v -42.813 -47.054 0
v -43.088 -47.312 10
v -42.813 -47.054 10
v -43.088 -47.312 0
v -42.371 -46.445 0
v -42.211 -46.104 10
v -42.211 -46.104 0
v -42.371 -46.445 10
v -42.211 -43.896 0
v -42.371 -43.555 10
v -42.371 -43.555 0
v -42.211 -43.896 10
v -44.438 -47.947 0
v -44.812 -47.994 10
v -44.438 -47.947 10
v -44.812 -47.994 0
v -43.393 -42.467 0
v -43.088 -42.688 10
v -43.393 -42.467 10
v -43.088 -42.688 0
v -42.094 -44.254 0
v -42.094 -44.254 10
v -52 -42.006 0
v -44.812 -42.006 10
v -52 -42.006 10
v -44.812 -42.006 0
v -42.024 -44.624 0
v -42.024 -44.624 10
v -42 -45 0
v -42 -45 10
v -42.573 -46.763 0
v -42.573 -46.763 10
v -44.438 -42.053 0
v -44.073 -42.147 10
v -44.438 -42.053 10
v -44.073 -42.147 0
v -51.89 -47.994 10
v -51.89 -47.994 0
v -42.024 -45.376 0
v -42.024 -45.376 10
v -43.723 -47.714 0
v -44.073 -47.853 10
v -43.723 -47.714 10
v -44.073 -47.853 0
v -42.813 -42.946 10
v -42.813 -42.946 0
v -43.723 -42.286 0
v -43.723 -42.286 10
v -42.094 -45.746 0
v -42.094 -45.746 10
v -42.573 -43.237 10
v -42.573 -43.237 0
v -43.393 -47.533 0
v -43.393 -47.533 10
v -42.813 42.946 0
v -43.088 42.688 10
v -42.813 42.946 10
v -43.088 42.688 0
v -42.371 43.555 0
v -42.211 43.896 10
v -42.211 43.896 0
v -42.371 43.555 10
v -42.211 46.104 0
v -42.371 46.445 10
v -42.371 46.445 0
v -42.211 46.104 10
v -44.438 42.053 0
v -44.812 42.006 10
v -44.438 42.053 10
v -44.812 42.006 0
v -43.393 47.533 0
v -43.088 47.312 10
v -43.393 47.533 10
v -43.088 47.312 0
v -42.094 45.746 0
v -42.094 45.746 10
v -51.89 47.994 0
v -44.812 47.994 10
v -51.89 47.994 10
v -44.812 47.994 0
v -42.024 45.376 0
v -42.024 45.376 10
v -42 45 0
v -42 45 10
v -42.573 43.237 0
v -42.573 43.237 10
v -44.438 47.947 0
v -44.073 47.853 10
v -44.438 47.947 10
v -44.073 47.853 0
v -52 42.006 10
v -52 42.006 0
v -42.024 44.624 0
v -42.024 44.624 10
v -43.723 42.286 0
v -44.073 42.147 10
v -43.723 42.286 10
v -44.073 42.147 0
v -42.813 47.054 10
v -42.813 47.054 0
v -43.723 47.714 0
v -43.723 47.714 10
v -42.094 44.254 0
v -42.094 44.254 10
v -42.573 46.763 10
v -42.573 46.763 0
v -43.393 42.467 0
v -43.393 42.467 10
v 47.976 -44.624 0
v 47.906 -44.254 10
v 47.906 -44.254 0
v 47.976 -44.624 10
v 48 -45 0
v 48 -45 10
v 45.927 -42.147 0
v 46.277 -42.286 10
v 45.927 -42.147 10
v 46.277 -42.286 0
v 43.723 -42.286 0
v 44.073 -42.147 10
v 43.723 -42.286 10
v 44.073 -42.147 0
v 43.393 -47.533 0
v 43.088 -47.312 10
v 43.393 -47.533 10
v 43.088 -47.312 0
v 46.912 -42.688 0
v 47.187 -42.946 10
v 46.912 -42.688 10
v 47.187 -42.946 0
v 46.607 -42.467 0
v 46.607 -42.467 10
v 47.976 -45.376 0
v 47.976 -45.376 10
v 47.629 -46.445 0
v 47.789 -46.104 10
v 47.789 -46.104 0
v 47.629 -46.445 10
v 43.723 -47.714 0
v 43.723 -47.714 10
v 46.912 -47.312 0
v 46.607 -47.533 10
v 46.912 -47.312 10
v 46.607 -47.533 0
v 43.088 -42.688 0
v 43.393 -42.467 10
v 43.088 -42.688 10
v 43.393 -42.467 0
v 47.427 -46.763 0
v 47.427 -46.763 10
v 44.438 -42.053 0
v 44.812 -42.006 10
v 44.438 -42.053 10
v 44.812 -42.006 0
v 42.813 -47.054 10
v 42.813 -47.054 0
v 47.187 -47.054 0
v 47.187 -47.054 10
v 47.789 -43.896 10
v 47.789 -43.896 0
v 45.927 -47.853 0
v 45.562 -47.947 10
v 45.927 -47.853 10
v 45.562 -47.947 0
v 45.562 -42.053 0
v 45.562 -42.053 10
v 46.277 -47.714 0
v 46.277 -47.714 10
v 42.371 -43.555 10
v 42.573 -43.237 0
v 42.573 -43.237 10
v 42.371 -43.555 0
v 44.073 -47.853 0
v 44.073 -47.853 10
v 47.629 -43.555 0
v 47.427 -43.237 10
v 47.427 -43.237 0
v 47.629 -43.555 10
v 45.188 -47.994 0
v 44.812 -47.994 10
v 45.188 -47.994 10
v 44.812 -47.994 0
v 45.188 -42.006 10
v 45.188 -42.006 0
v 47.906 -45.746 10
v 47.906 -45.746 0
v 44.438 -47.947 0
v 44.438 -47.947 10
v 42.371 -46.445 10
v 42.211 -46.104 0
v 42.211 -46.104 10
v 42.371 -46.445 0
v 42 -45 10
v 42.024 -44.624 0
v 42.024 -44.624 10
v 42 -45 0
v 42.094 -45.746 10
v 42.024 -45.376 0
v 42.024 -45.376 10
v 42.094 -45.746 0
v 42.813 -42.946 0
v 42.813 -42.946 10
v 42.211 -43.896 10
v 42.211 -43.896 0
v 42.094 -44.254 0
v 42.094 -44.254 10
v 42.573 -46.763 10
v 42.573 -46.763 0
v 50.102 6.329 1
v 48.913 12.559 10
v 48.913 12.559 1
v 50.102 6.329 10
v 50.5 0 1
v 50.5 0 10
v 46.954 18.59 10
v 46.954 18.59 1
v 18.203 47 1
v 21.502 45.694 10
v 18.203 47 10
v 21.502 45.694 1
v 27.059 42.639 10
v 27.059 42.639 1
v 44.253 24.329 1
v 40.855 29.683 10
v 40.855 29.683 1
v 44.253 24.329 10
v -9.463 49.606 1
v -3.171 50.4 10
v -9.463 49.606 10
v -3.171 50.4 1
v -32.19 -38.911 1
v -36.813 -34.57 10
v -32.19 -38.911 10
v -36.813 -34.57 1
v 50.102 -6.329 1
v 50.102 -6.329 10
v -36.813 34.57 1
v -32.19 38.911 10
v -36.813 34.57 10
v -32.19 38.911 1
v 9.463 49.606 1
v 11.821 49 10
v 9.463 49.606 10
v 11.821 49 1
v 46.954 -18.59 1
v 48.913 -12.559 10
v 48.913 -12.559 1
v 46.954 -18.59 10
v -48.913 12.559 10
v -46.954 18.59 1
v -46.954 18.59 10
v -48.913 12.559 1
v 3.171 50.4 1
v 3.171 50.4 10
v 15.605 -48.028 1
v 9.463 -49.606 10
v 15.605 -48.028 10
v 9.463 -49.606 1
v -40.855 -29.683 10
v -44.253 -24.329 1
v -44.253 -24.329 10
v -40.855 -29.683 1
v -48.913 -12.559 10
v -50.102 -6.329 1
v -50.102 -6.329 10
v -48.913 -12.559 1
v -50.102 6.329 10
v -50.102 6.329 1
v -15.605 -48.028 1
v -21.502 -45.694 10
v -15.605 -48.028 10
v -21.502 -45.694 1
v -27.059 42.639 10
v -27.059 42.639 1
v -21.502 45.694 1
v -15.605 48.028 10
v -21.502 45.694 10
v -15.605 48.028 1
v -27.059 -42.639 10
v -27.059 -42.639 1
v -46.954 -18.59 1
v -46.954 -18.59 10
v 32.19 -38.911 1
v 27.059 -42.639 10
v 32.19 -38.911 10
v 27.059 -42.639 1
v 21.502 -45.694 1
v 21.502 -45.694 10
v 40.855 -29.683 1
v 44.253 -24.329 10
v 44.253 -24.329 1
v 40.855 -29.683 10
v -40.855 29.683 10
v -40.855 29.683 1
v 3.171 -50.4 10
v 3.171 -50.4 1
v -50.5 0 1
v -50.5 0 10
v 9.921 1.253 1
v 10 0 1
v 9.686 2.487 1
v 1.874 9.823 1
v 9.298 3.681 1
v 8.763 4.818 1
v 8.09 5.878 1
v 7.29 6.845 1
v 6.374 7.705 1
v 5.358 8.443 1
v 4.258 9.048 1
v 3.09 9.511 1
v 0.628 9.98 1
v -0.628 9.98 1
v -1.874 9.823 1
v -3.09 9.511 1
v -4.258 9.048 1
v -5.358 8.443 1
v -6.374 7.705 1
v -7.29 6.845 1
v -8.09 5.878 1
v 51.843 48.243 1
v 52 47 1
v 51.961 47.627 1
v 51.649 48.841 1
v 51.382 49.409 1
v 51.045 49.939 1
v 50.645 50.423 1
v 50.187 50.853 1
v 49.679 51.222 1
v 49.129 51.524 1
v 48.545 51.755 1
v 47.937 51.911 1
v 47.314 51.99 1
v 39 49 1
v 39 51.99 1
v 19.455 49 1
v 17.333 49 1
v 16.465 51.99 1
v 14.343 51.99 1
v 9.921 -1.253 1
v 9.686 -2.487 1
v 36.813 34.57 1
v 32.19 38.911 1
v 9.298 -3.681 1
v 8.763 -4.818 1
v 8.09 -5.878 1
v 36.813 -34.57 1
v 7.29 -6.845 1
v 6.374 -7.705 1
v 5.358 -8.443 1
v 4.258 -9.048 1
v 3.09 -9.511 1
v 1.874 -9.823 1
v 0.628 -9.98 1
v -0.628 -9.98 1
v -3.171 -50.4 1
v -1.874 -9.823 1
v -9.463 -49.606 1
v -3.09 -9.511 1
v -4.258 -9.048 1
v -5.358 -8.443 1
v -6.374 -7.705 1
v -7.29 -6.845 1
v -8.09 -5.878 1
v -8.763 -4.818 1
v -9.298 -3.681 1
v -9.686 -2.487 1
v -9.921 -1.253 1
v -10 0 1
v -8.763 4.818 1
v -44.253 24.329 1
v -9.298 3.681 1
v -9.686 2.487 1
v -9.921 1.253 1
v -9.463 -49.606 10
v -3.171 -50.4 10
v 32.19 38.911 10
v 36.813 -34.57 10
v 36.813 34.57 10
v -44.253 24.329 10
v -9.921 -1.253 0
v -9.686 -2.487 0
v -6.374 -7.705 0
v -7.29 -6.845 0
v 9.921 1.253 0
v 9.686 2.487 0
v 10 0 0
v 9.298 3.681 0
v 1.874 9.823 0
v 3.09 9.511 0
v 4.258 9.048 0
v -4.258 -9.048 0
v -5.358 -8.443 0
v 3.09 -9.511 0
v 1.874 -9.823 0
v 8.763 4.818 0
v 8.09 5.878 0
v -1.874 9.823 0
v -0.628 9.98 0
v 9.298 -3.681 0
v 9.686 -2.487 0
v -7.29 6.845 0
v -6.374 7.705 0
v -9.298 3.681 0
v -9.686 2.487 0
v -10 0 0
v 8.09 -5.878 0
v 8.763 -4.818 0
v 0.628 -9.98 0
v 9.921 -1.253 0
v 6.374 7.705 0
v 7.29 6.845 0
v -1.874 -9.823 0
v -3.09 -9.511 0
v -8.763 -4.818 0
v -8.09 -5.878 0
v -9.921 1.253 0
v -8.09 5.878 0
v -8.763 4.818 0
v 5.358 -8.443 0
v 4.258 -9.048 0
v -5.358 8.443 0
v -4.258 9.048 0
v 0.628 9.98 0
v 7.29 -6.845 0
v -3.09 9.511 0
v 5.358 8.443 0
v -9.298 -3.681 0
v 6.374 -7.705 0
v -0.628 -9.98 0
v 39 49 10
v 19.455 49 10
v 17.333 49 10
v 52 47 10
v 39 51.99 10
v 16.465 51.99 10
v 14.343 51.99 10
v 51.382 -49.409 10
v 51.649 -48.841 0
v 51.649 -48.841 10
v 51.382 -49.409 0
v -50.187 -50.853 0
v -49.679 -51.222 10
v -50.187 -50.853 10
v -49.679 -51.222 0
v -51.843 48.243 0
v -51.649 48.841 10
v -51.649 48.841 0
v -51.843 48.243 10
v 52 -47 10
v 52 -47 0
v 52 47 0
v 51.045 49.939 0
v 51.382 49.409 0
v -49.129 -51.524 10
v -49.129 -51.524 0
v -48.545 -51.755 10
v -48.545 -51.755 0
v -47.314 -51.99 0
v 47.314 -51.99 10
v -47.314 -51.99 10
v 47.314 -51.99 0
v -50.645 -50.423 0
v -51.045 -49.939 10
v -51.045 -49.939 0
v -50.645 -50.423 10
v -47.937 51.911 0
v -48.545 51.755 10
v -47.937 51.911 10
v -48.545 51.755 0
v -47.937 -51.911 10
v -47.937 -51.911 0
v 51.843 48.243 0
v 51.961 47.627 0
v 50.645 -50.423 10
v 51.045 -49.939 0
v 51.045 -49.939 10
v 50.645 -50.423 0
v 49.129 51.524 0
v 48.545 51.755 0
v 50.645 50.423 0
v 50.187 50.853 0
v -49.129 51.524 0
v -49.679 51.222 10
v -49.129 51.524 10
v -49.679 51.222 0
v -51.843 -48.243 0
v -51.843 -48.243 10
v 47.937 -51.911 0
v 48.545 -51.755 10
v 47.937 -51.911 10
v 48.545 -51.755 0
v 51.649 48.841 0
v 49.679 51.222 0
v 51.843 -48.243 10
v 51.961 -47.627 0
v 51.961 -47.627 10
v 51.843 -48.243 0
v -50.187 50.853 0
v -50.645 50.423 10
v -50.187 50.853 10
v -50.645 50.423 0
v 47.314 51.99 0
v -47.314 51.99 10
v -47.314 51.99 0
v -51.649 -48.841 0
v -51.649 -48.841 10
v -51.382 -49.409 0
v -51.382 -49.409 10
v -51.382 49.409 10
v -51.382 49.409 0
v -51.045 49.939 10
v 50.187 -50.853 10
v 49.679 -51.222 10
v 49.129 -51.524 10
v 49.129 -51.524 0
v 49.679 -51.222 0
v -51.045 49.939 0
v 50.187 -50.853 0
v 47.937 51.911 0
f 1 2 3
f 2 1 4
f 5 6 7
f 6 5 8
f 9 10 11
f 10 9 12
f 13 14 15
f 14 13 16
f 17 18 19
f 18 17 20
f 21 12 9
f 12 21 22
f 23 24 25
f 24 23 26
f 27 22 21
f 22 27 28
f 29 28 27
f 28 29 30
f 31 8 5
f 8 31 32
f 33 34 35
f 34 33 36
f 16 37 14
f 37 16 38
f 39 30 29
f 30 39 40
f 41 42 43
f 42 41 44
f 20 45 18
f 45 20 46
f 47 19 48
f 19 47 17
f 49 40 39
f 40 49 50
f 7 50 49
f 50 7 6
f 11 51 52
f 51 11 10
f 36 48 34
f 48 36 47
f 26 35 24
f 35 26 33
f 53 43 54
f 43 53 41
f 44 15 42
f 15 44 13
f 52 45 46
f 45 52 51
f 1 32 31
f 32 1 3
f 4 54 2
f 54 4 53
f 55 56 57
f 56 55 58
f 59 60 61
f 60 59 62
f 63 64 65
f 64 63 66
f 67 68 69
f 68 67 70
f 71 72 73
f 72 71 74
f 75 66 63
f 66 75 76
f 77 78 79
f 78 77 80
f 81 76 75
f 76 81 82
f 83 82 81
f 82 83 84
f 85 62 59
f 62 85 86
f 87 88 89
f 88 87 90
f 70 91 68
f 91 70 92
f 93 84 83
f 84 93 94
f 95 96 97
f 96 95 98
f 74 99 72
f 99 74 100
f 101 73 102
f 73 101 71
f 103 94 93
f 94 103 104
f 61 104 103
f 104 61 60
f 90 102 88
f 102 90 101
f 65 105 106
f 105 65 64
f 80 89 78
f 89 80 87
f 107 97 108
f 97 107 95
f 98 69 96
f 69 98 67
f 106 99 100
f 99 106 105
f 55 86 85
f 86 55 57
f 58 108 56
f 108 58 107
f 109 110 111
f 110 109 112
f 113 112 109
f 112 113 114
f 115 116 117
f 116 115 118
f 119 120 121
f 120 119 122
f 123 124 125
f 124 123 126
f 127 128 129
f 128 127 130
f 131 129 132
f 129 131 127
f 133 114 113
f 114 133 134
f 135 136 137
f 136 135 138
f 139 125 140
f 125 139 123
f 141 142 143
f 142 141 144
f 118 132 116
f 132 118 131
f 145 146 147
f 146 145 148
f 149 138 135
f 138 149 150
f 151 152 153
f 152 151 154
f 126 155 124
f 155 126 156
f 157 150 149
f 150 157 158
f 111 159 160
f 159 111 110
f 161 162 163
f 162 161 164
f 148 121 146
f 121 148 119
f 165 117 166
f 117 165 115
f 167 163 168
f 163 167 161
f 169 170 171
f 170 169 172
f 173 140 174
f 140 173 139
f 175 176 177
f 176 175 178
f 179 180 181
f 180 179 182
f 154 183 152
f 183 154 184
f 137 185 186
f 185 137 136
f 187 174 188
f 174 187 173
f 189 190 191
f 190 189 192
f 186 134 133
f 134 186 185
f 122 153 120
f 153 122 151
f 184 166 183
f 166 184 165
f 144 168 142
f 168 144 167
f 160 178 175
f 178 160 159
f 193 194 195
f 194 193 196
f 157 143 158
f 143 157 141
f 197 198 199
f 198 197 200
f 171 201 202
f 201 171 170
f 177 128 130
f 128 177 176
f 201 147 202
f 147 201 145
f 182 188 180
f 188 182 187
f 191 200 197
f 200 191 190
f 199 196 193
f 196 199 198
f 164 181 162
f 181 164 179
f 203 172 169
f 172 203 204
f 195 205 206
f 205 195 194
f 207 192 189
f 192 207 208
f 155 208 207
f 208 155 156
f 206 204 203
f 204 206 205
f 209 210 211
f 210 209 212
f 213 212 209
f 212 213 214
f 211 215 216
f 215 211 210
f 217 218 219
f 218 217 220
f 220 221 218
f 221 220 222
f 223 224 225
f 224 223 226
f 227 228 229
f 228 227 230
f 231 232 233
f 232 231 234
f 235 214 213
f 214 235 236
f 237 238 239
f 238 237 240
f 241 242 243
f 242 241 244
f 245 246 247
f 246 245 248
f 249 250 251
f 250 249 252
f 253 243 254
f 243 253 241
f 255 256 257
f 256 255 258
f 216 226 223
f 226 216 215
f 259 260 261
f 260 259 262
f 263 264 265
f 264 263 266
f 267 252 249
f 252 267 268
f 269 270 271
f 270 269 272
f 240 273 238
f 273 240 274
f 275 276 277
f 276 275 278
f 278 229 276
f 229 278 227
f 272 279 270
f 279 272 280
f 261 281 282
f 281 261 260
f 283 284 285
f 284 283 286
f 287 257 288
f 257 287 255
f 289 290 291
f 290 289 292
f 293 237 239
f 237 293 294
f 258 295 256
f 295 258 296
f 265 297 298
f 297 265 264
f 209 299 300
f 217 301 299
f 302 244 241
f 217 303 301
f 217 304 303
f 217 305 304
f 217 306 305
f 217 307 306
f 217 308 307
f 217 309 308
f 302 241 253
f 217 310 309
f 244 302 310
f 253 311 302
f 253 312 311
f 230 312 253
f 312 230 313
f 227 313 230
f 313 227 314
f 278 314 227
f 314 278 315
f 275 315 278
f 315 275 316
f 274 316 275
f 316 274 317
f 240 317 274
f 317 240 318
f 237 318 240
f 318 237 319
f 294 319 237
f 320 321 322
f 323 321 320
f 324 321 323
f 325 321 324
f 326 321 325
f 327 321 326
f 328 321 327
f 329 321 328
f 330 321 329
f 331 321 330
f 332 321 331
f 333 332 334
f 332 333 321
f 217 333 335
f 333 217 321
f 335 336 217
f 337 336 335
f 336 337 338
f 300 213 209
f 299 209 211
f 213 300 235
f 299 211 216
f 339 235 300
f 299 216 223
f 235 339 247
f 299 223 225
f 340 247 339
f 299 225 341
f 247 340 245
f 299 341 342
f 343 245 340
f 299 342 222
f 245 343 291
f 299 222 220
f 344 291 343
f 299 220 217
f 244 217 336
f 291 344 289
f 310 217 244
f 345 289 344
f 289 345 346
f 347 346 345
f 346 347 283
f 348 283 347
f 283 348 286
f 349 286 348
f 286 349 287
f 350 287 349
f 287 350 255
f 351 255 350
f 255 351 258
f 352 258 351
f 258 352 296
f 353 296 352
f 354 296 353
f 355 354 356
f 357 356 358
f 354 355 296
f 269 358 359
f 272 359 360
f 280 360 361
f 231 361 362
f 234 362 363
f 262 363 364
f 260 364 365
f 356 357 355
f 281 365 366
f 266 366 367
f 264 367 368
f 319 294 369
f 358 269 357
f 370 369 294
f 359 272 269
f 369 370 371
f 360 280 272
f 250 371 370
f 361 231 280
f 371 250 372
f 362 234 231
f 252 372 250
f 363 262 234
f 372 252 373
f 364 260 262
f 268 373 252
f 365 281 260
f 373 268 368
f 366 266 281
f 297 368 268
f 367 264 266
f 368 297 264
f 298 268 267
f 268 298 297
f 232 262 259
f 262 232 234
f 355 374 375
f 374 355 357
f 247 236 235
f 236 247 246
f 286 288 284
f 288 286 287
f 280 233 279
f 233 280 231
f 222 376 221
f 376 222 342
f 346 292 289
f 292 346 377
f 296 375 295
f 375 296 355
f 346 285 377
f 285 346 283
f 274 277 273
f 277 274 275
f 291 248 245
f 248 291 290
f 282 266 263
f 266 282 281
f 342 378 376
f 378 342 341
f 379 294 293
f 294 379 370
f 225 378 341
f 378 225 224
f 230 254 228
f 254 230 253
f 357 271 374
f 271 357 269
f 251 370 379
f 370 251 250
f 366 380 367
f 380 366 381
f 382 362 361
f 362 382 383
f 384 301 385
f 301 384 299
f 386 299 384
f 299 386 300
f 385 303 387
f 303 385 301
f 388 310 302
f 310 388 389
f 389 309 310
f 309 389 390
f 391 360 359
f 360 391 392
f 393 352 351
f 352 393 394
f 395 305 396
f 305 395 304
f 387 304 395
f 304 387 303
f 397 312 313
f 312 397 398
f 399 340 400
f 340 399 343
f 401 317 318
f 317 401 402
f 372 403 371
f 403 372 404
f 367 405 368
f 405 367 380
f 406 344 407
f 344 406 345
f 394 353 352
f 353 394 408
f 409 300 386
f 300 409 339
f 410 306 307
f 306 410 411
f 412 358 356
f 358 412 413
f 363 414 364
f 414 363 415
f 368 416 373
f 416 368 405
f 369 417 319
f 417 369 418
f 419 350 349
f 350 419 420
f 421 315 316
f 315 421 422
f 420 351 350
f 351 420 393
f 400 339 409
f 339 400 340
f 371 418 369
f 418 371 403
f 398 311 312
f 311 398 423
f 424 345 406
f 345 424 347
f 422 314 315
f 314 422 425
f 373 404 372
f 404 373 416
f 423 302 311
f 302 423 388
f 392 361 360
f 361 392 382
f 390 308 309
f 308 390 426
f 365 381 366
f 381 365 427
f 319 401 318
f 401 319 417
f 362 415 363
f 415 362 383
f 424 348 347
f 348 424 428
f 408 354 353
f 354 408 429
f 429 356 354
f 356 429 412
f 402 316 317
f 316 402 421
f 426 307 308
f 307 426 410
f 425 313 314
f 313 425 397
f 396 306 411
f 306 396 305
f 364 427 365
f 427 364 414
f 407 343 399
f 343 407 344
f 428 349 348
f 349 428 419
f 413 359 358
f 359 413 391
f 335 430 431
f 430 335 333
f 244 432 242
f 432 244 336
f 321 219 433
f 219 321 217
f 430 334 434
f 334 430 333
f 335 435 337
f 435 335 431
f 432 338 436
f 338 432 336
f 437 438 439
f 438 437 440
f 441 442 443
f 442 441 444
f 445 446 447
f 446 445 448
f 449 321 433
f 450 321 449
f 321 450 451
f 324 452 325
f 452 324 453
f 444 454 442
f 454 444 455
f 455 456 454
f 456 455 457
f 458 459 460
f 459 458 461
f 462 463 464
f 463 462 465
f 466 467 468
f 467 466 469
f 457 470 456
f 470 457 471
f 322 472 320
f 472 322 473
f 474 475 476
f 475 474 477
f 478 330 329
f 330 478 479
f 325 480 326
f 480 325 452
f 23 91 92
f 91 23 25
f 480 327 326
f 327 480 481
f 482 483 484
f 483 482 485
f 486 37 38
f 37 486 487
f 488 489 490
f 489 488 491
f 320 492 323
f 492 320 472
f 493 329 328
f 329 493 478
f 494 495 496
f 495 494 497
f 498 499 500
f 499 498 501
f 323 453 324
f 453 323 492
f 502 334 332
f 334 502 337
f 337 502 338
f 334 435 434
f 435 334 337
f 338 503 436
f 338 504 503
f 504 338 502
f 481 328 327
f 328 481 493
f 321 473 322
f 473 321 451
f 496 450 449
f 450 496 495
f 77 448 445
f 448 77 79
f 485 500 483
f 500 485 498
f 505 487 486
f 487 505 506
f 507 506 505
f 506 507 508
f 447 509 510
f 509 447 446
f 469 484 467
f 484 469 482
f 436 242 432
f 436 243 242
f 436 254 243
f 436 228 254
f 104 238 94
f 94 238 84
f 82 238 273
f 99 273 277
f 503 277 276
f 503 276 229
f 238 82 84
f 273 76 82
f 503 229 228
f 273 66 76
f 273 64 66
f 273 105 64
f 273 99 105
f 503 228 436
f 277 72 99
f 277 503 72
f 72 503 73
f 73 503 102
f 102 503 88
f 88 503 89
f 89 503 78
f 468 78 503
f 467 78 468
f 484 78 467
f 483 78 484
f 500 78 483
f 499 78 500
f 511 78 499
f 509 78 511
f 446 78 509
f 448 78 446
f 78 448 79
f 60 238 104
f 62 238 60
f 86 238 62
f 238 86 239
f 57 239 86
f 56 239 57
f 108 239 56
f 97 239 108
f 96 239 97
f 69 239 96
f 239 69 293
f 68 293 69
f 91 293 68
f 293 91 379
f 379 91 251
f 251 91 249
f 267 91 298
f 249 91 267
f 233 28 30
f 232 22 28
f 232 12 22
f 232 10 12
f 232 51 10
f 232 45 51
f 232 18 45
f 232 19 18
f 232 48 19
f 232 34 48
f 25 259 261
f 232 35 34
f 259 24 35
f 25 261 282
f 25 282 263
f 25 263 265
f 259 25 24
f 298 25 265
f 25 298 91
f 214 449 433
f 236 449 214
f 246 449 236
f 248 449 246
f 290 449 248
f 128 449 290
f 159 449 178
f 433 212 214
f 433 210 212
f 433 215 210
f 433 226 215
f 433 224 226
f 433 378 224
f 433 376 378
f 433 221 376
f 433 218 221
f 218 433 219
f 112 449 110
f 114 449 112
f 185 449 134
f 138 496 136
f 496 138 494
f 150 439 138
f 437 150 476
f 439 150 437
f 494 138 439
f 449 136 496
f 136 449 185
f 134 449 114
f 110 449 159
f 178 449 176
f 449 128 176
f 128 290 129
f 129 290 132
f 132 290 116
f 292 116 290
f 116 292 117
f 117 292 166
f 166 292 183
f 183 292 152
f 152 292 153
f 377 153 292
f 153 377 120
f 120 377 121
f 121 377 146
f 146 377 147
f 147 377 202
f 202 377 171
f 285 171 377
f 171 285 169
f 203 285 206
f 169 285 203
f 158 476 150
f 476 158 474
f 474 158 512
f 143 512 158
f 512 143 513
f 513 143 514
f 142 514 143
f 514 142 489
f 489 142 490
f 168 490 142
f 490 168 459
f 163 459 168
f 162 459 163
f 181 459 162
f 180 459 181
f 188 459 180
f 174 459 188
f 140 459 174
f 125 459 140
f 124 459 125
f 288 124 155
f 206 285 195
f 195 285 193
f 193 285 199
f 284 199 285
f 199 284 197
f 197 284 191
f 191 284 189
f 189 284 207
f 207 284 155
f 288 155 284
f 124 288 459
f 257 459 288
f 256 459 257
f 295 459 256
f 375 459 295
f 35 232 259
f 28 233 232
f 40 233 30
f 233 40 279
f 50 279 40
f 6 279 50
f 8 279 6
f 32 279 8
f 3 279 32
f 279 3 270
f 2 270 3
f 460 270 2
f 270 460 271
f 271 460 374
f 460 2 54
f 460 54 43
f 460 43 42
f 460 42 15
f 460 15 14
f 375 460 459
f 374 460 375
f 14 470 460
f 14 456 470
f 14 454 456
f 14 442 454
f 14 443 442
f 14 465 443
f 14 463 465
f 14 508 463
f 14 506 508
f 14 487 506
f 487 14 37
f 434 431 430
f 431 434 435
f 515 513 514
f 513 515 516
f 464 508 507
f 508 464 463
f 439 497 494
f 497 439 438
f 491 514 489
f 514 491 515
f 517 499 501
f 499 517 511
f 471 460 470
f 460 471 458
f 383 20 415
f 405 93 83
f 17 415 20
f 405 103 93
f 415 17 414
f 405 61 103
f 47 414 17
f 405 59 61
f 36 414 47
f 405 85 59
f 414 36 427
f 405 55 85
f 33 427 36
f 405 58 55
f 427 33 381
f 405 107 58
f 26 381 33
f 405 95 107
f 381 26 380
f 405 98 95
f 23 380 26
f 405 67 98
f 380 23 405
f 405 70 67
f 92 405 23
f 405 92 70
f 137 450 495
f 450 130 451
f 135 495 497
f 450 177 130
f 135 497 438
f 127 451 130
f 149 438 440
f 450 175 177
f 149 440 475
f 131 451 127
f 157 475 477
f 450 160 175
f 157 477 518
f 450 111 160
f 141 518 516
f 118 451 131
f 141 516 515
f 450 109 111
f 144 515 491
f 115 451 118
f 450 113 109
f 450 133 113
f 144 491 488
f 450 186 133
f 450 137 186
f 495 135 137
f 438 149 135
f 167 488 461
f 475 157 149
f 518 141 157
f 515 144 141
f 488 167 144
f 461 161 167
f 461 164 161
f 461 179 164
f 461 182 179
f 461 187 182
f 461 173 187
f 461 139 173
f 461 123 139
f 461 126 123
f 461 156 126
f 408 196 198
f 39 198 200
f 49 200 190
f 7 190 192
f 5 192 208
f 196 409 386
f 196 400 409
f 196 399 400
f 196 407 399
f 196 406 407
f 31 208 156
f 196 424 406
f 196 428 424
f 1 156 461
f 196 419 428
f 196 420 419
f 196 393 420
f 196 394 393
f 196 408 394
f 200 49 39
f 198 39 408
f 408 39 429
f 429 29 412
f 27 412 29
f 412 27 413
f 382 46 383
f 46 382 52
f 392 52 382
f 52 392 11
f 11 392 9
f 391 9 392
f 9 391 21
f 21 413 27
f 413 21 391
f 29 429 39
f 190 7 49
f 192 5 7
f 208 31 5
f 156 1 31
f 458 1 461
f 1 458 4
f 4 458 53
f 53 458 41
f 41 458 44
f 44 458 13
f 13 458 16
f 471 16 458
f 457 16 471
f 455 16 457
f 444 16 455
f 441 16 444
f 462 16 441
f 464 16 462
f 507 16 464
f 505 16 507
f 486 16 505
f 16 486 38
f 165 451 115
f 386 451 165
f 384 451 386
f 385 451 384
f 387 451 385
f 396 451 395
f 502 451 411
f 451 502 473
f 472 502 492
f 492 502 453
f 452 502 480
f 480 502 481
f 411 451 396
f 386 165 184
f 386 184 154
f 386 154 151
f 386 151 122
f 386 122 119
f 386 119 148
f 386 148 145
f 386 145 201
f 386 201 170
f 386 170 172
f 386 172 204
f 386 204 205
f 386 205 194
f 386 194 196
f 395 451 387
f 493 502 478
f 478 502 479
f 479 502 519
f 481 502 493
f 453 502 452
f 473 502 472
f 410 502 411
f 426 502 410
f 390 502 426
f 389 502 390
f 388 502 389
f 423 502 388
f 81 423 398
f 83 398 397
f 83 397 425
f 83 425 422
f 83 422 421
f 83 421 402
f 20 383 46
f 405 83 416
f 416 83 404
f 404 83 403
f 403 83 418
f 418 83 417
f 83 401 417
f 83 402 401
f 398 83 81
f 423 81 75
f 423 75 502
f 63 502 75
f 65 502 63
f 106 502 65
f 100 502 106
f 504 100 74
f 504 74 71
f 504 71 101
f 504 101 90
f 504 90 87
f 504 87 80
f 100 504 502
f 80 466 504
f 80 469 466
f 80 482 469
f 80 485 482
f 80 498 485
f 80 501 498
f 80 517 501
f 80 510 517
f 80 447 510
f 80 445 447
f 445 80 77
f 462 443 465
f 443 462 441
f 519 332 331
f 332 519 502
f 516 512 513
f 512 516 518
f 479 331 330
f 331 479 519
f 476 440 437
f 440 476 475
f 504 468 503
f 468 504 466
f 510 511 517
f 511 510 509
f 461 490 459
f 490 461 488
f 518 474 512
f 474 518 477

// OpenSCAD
$fn = 50;


difference() {
	union() {
		translate(v = [0, 0, 0]) {
			rotate(a = [0, 0, 0]) {
				hull() {
					translate(v = [-47.0000000000, 47.0000000000, 0]) {
						rotate(a = [0, 0, 0]) {
							translate(v = [0, 0, 0]) {
								rotate(a = [0, 0, 0]) {
									cylinder(h = 10, r = 5);
								}
							}
						}
					}
					translate(v = [47.0000000000, 47.0000000000, 0]) {
						rotate(a = [0, 0, 0]) {
							translate(v = [0, 0, 0]) {
								rotate(a = [0, 0, 0]) {
									cylinder(h = 10, r = 5);
								}
							}
						}
					}
					translate(v = [-47.0000000000, -47.0000000000, 0]) {
						rotate(a = [0, 0, 0]) {
							translate(v = [0, 0, 0]) {
								rotate(a = [0, 0, 0]) {
									cylinder(h = 10, r = 5);
								}
							}
						}
					}
					translate(v = [47.0000000000, -47.0000000000, 0]) {
						rotate(a = [0, 0, 0]) {
							translate(v = [0, 0, 0]) {
								rotate(a = [0, 0, 0]) {
									cylinder(h = 10, r = 5);
								}
							}
						}
					}
				}
			}
		}
	}
	union() {
		translate(v = [-52.5000000000, -45.0000000000, -125]) {
			rotate(a = [0, 0, 0]) {
				hull() {
					translate(v = [7.5000000000, 0, 0]) {
						rotate(a = [0, 0, 0]) {
							translate(v = [0, 0, 0]) {
								rotate(a = [0, 0, 0]) {
									cylinder(h = 250, r = 3.0000000000);
								}
							}
						}
					}
					translate(v = [-7.5000000000, 0, 0]) {
						rotate(a = [0, 0, 0]) {
							translate(v = [0, 0, 0]) {
								rotate(a = [0, 0, 0]) {
									cylinder(h = 250, r = 3.0000000000);
								}
							}
						}
					}
				}
			}
		}
		translate(v = [-52.5000000000, 45.0000000000, -125]) {
			rotate(a = [0, 0, 0]) {
				hull() {
					translate(v = [7.5000000000, 0, 0]) {
						rotate(a = [0, 0, 0]) {
							translate(v = [0, 0, 0]) {
								rotate(a = [0, 0, 0]) {
									cylinder(h = 250, r = 3.0000000000);
								}
							}
						}
					}
					translate(v = [-7.5000000000, 0, 0]) {
						rotate(a = [0, 0, 0]) {
							translate(v = [0, 0, 0]) {
								rotate(a = [0, 0, 0]) {
									cylinder(h = 250, r = 3.0000000000);
								}
							}
						}
					}
				}
			}
		}
		translate(v = [45.0000000000, -45.0000000000, -125.0000000000]) {
			rotate(a = [0, 0, 0]) {
				cylinder(h = 250, r = 3.0000000000);
			}
		}
		translate(v = [0, 0, 1.0000000000]) {
			rotate(a = [0, 0, 0]) {
				cylinder(h = 12, r = 50.5000000000);
			}
		}
		translate(v = [0, 0, -5.0000000000]) {
			rotate(a = [0, 0, 0]) {
				cylinder(h = 10, r = 10.0000000000);
			}
		}
		translate(v = [0.0000000000, 47.0000000000, 1]) {
			rotate(a = [0, 0, 0]) {
				cube(size = [52.0000000000, 2, 12]);
			}
		}
		translate(v = [39.0000000000, 47.0000000000, 1]) {
			rotate(a = [0, 0, 0]) {
				cube(size = [13.0000000000, 5, 12]);
			}
		}
		translate(v = [13.5833333333, 52.7500000000, 1]) {
			rotate(a = [0, 0, -45]) {
				cube(size = [7.5000000000, 1.5000000000, 12]);
			}
		}
	}
}
